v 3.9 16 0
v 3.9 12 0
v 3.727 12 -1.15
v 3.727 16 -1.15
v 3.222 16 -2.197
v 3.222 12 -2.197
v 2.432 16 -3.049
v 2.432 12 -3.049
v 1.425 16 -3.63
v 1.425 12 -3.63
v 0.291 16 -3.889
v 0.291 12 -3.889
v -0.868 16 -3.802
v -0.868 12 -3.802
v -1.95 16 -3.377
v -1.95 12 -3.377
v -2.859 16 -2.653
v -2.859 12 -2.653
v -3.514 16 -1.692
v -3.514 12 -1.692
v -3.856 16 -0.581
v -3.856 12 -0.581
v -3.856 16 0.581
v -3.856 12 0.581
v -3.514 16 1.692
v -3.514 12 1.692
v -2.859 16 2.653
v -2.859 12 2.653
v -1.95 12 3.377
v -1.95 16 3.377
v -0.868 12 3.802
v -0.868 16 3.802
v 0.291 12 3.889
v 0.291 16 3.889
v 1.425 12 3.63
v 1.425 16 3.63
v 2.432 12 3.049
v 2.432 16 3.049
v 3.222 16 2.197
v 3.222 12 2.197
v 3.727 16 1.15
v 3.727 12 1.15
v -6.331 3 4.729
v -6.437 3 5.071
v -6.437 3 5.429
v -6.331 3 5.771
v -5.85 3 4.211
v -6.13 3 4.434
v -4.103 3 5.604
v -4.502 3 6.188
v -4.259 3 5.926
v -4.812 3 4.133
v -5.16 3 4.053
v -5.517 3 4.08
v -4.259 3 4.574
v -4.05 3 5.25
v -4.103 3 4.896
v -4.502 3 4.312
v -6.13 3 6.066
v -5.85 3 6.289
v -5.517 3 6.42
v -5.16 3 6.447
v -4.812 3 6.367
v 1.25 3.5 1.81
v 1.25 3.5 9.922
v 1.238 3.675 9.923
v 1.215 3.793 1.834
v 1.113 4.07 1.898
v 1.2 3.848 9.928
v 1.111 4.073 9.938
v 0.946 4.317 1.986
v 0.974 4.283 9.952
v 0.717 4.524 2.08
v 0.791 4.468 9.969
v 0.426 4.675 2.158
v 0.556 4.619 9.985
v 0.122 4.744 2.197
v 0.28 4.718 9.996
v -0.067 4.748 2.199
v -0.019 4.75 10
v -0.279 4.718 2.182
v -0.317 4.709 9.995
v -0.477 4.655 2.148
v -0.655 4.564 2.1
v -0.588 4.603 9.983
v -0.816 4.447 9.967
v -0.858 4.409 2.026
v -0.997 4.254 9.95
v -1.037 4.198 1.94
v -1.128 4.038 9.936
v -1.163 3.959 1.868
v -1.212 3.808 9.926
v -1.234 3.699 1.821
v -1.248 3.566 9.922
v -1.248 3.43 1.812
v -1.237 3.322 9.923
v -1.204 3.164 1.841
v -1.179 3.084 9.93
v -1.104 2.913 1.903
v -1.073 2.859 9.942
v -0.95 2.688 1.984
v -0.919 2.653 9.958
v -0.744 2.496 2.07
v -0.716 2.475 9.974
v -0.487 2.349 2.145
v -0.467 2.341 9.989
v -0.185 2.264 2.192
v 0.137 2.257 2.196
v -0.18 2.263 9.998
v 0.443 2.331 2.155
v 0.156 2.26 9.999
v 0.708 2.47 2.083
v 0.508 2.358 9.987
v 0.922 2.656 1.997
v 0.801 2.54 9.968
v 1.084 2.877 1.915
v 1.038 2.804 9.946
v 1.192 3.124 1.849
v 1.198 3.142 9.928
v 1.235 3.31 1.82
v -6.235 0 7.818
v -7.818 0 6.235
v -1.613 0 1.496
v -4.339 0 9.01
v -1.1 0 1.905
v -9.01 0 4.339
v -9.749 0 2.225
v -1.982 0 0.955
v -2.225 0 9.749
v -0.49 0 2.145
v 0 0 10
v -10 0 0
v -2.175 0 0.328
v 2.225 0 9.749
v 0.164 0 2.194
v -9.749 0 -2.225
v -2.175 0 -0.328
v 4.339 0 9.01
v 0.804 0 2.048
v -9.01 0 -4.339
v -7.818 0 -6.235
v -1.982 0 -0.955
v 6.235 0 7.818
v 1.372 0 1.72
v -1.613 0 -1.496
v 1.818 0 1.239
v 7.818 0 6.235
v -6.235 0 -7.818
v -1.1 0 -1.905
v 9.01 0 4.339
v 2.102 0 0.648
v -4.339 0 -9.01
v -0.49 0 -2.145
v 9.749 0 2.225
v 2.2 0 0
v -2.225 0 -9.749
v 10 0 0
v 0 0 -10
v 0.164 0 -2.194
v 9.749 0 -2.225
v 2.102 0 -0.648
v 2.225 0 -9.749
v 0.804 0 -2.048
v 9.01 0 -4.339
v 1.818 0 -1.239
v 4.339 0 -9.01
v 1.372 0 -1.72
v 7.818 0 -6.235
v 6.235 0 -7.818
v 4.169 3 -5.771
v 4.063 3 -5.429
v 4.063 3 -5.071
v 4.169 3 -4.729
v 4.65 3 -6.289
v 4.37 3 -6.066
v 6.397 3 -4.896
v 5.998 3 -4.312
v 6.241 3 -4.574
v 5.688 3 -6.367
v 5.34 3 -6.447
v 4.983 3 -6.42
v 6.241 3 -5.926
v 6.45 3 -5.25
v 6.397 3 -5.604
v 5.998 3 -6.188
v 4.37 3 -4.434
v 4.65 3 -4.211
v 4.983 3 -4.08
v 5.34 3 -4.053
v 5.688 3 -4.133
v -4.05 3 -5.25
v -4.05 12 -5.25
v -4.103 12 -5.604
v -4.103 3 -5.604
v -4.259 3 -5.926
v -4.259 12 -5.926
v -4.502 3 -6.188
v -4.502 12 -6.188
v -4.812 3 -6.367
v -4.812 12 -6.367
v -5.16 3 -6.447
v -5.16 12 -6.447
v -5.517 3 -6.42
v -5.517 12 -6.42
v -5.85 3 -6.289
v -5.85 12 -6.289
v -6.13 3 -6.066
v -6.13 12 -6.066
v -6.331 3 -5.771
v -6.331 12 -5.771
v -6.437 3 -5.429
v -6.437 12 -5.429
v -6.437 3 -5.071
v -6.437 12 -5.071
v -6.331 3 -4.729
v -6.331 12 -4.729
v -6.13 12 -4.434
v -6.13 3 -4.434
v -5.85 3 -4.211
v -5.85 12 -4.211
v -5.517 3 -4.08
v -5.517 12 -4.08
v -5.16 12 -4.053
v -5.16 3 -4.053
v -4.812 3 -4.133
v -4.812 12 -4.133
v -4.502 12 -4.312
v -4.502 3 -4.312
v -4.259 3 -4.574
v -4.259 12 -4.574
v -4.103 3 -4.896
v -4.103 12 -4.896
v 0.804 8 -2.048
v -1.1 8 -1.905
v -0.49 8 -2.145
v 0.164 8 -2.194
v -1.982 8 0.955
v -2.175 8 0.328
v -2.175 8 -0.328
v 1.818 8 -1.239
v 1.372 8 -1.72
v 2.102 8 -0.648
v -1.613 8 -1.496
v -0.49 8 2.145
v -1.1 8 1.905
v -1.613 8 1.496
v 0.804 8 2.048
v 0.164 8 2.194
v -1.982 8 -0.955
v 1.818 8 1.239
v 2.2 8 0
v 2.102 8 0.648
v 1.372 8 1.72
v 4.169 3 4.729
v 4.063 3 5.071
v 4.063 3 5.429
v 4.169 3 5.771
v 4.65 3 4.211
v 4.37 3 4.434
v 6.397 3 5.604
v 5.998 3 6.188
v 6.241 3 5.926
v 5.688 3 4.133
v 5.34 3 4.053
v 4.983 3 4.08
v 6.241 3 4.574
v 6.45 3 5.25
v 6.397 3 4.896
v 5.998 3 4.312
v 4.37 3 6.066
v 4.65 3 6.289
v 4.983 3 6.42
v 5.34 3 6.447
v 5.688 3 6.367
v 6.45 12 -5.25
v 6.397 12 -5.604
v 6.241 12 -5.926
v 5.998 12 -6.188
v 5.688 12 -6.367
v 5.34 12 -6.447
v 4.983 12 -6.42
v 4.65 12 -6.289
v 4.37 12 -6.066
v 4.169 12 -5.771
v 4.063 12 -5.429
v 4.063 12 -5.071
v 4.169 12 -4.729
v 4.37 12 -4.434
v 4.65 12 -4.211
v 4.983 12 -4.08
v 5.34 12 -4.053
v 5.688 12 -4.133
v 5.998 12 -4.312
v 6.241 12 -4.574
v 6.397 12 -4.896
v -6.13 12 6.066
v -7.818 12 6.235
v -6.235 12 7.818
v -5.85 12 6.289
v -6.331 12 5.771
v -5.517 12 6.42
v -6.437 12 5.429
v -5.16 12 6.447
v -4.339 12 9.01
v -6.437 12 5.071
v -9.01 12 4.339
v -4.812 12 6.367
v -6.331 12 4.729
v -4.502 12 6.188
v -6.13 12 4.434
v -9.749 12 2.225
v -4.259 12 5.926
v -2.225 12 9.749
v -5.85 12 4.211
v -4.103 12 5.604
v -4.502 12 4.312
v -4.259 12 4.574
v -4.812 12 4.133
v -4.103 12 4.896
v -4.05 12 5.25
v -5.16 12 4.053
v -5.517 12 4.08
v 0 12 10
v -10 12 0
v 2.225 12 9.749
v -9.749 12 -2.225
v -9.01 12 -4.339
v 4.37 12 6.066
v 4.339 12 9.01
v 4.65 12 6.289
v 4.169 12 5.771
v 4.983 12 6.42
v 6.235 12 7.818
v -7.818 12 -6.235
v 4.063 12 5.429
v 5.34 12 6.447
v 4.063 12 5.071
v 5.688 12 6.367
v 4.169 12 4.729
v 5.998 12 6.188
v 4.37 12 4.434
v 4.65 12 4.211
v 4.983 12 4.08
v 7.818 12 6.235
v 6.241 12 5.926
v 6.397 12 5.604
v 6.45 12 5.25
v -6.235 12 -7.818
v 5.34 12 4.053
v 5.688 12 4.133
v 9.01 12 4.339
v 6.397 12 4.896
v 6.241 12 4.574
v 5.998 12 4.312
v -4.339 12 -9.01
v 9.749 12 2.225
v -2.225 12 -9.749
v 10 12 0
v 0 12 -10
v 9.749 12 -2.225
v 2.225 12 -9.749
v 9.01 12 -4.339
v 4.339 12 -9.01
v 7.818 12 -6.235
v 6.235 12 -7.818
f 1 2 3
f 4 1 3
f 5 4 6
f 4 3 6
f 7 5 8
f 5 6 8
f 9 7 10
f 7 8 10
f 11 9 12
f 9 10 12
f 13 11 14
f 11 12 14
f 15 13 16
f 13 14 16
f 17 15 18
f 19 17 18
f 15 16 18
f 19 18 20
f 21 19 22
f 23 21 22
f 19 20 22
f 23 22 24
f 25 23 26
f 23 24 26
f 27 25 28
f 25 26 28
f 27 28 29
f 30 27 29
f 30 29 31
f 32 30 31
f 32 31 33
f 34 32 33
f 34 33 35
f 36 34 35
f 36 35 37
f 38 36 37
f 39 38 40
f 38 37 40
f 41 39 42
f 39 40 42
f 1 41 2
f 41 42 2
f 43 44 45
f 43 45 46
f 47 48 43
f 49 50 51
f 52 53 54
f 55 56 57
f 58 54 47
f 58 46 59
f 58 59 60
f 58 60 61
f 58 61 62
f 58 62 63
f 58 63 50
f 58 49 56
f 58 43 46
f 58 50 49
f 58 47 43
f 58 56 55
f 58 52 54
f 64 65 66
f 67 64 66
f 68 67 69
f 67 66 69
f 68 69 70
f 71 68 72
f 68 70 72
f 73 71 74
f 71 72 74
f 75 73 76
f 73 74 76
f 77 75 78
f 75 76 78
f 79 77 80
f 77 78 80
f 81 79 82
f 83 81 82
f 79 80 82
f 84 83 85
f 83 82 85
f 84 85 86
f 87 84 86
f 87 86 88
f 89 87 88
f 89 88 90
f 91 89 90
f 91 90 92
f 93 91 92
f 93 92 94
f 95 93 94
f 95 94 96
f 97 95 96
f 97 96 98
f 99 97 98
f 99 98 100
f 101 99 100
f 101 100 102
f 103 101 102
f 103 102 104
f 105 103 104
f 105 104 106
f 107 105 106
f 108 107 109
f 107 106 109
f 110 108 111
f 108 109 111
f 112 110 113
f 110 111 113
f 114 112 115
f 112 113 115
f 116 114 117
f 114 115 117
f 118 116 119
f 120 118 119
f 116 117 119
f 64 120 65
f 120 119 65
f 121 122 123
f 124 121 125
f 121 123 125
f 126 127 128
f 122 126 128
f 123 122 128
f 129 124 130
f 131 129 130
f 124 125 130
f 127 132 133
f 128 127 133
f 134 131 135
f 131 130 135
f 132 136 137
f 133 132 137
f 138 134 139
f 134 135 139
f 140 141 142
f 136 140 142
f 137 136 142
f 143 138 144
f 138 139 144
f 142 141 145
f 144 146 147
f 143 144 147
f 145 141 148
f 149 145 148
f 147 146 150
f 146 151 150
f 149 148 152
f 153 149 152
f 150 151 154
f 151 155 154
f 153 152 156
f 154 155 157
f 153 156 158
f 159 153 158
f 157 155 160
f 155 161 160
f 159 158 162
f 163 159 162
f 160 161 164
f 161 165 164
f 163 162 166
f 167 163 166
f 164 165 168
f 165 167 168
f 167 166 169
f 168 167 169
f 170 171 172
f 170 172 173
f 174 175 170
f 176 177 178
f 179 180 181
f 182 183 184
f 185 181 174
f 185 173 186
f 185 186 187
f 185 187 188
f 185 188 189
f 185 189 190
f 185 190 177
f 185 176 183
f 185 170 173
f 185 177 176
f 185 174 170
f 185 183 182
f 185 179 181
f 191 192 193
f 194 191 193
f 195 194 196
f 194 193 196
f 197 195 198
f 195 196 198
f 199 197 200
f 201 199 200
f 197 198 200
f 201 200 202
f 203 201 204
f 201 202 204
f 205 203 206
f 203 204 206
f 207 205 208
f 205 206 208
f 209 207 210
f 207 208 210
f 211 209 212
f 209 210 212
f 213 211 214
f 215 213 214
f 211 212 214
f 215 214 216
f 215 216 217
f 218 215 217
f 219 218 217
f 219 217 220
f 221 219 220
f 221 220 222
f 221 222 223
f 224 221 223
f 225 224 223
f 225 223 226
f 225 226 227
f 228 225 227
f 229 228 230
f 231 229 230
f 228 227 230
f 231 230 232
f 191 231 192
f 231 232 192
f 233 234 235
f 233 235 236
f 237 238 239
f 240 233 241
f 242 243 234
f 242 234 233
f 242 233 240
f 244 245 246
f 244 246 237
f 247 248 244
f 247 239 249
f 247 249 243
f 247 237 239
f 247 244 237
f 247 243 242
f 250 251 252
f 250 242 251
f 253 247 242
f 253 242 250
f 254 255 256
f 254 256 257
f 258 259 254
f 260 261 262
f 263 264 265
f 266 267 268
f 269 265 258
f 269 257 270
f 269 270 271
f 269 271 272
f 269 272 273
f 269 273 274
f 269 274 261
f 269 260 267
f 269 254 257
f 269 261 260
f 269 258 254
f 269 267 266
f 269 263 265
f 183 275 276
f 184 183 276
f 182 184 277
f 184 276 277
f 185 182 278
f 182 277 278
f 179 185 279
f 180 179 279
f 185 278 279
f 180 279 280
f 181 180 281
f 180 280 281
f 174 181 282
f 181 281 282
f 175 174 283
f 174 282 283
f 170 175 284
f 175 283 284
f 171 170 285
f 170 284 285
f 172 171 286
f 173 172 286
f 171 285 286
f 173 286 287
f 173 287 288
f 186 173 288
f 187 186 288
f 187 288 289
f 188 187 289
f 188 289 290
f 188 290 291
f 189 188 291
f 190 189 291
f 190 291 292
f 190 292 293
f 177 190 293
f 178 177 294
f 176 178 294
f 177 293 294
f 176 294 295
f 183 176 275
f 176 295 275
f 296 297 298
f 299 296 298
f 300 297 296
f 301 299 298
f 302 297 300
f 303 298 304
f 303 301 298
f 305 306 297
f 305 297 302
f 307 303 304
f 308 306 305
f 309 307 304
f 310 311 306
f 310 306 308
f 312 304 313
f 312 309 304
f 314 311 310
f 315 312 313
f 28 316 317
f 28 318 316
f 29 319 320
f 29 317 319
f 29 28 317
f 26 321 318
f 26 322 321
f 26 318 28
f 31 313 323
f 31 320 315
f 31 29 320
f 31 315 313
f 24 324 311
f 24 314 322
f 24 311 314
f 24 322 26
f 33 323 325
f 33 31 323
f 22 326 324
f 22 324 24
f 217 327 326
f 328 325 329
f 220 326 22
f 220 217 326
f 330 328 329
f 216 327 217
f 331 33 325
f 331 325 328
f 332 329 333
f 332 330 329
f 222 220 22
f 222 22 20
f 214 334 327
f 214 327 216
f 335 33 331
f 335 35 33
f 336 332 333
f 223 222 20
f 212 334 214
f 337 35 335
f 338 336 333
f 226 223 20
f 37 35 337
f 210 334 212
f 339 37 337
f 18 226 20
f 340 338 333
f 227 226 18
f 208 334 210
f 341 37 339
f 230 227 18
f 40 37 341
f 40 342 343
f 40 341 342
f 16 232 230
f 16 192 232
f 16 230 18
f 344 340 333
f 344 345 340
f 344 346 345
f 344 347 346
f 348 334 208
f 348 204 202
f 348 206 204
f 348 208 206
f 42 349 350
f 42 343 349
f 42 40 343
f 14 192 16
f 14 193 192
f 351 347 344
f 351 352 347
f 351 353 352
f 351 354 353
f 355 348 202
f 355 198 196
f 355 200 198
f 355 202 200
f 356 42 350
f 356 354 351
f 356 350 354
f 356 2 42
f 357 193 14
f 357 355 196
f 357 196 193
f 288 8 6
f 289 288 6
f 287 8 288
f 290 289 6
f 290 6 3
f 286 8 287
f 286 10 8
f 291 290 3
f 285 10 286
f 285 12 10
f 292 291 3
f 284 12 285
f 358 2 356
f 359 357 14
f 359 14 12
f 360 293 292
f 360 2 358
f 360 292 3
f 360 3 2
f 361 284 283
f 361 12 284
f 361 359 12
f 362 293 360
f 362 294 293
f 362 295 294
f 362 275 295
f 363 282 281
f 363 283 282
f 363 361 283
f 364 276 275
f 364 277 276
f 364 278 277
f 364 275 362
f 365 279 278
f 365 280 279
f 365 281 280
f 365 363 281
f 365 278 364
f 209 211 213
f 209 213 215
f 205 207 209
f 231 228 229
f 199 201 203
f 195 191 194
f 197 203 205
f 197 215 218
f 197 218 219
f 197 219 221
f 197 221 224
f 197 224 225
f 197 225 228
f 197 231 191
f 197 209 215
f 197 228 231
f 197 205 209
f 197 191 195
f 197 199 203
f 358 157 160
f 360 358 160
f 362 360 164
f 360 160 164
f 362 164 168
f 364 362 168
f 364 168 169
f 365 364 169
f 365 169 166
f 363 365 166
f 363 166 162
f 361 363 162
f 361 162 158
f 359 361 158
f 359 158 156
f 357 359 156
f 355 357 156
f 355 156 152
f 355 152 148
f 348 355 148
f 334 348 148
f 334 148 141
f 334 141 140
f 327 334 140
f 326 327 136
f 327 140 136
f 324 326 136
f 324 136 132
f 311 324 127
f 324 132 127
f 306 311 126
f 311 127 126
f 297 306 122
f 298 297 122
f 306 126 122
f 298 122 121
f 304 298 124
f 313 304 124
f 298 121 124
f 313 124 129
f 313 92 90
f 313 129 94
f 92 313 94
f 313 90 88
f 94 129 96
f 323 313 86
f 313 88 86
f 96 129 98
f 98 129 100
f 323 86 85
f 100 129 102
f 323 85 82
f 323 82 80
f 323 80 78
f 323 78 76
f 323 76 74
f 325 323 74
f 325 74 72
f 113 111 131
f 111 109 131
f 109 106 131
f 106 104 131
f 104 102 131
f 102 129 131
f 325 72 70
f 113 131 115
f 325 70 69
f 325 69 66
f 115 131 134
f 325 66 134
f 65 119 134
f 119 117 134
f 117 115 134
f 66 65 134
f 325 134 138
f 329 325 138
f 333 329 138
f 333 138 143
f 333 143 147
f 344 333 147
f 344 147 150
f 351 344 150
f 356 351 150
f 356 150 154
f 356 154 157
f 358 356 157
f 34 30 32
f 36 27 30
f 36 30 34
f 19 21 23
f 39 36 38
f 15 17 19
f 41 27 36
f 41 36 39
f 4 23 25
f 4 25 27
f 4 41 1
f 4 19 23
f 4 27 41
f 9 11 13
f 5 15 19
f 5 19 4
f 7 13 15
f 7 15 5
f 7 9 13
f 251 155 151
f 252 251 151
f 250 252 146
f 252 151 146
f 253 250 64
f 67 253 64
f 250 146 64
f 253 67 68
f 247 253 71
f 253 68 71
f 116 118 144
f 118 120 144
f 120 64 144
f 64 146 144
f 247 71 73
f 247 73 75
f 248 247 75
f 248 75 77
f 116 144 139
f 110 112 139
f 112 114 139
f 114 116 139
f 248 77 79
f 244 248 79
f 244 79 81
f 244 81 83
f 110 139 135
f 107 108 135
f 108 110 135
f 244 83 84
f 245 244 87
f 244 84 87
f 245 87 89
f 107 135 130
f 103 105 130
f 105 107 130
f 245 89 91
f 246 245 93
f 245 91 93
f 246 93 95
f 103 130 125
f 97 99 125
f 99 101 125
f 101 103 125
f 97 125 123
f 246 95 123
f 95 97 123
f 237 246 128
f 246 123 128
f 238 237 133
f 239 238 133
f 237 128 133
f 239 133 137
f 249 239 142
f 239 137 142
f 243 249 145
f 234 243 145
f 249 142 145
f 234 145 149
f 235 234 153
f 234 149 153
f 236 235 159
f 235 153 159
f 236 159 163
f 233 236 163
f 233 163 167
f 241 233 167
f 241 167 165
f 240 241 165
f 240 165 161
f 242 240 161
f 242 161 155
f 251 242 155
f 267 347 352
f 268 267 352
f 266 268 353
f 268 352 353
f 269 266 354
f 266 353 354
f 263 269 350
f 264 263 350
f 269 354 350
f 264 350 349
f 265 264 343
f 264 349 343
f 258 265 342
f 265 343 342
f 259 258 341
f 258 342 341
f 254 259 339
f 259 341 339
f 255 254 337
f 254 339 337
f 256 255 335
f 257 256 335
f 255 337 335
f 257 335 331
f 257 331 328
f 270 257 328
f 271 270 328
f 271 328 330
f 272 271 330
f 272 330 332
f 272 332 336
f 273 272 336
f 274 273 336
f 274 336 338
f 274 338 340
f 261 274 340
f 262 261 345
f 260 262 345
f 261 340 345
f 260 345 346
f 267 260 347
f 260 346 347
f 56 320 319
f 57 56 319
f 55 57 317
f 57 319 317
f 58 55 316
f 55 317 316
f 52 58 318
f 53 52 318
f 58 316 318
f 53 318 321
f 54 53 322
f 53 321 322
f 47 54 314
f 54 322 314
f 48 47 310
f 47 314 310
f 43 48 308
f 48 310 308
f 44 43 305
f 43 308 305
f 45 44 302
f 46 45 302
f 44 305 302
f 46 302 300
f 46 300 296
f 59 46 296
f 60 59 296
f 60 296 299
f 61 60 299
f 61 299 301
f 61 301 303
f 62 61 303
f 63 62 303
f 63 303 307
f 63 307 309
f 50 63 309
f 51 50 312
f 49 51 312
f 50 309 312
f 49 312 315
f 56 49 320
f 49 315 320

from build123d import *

# Parameters (mm, degrees)
SKIZZE1_R                       = 10
AUFSATZ_LINEAR_AUSTRAGEN1_DEPTH = 12
SKIZZE2_R                       = 3.9
AUFSATZ_LINEAR_AUSTRAGEN2_DEPTH = 4
SKIZZE3_R                       = 2.2
SCHNITT_LINEAR_AUSTRAGEN1_DEPTH = 8
SCHNITT_LINEAR_AUSTRAGEN2_REACH = 22
SKIZZE4_R                       = 1.25
SKIZZE5_R                       = 1.2
SCHNITT_LINEAR_AUSTRAGEN3_DEPTH = 9


with BuildPart() as part:
    # Skizze1 → Aufsatz-Linear austragen1 (new body)
    with BuildSketch(Plane(origin=(0, 0, 0), x_dir=(1, 0, 0), z_dir=(0, 1, 0))):
        Circle(SKIZZE1_R)
    extrude(amount=AUFSATZ_LINEAR_AUSTRAGEN1_DEPTH)

    # Skizze2 → Aufsatz-Linear austragen2 (add)
    with BuildSketch(Plane(origin=(0, 12, 0), x_dir=(1, 0, 0), z_dir=(0, 1, 0))):
        Circle(SKIZZE2_R)
    extrude(amount=AUFSATZ_LINEAR_AUSTRAGEN2_DEPTH)

    # Skizze3 → Schnitt-Linear austragen1 (cut)
    with BuildSketch(Plane.XZ):
        Circle(SKIZZE3_R)
    extrude(amount=-SCHNITT_LINEAR_AUSTRAGEN1_DEPTH, mode=Mode.SUBTRACT)

    # Skizze4 → Schnitt-Linear austragen2 (cut, up to next)
    with BuildSketch(Plane.XY.offset(10), mode=Mode.PRIVATE) as schnitt_linear_austragen2_sk1:
        with Locations((0, 3.5)):
            Circle(SKIZZE4_R)
    schnitt_linear_austragen2_tool1 = extrude(schnitt_linear_austragen2_sk1.sketch, amount=-SCHNITT_LINEAR_AUSTRAGEN2_REACH, mode=Mode.PRIVATE) & part.part
    add(schnitt_linear_austragen2_tool1.solids().sort_by_distance((0, 3.5, 10))[0], mode=Mode.SUBTRACT)

    # Skizze5 → Schnitt-Linear austragen3 (cut)
    with BuildSketch(Plane(origin=(0, 12, 0), x_dir=(1, 0, 0), z_dir=(0, 1, 0))):
        with Locations((-5.25, 5.25)):
            Circle(SKIZZE5_R)
        with Locations((5.25, 5.25)):
            Circle(SKIZZE5_R)
        with Locations((5.25, -5.25)):
            Circle(SKIZZE5_R)
        with Locations((-5.25, -5.25)):
            Circle(SKIZZE5_R)
    extrude(amount=-SCHNITT_LINEAR_AUSTRAGEN3_DEPTH, mode=Mode.SUBTRACT)


solid = part.part
